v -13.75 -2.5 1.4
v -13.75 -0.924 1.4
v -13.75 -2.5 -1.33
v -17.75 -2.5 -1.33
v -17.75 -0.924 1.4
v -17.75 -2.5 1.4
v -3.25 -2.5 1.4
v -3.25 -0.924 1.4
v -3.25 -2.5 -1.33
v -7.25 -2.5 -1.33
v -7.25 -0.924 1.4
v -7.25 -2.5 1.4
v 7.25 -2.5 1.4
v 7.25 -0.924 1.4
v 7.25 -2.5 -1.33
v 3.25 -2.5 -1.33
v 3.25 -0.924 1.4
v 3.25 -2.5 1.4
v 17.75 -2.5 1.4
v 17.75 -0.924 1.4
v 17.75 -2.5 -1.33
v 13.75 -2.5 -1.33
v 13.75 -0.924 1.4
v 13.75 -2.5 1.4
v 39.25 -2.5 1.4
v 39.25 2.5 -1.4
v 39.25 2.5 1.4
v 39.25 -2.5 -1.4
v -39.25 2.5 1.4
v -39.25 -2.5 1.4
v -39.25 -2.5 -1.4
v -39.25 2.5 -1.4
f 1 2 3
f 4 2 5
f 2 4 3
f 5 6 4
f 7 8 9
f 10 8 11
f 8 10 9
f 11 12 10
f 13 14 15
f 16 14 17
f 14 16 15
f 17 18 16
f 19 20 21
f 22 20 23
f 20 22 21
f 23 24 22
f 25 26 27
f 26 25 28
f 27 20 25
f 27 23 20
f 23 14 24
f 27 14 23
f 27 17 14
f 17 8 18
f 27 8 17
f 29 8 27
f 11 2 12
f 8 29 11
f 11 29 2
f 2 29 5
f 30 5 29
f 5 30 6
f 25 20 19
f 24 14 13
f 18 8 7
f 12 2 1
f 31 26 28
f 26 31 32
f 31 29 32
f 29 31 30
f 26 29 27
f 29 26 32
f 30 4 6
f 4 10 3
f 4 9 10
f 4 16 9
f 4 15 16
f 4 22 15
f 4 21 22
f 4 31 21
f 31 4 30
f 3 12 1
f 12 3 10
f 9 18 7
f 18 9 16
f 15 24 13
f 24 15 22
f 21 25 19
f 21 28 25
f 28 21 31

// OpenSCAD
difference()
{
  cube(size=[6*(6+4.5)+4.5+1+10,5,2.8],center=true);

  rotate([60,0,0])
  {
    translate(v=[-15.75,0,5])
      cube(size=[4,7,7],center=true);

    translate(v=[-5.25,0,5])
      cube(size=[4,7,7],center=true);

    translate(v=[5.25,0,5])
      cube(size=[4,7,7],center=true);

    translate(v=[15.75,0,5])
      cube(size=[4,7,7],center=true);
  }
}
